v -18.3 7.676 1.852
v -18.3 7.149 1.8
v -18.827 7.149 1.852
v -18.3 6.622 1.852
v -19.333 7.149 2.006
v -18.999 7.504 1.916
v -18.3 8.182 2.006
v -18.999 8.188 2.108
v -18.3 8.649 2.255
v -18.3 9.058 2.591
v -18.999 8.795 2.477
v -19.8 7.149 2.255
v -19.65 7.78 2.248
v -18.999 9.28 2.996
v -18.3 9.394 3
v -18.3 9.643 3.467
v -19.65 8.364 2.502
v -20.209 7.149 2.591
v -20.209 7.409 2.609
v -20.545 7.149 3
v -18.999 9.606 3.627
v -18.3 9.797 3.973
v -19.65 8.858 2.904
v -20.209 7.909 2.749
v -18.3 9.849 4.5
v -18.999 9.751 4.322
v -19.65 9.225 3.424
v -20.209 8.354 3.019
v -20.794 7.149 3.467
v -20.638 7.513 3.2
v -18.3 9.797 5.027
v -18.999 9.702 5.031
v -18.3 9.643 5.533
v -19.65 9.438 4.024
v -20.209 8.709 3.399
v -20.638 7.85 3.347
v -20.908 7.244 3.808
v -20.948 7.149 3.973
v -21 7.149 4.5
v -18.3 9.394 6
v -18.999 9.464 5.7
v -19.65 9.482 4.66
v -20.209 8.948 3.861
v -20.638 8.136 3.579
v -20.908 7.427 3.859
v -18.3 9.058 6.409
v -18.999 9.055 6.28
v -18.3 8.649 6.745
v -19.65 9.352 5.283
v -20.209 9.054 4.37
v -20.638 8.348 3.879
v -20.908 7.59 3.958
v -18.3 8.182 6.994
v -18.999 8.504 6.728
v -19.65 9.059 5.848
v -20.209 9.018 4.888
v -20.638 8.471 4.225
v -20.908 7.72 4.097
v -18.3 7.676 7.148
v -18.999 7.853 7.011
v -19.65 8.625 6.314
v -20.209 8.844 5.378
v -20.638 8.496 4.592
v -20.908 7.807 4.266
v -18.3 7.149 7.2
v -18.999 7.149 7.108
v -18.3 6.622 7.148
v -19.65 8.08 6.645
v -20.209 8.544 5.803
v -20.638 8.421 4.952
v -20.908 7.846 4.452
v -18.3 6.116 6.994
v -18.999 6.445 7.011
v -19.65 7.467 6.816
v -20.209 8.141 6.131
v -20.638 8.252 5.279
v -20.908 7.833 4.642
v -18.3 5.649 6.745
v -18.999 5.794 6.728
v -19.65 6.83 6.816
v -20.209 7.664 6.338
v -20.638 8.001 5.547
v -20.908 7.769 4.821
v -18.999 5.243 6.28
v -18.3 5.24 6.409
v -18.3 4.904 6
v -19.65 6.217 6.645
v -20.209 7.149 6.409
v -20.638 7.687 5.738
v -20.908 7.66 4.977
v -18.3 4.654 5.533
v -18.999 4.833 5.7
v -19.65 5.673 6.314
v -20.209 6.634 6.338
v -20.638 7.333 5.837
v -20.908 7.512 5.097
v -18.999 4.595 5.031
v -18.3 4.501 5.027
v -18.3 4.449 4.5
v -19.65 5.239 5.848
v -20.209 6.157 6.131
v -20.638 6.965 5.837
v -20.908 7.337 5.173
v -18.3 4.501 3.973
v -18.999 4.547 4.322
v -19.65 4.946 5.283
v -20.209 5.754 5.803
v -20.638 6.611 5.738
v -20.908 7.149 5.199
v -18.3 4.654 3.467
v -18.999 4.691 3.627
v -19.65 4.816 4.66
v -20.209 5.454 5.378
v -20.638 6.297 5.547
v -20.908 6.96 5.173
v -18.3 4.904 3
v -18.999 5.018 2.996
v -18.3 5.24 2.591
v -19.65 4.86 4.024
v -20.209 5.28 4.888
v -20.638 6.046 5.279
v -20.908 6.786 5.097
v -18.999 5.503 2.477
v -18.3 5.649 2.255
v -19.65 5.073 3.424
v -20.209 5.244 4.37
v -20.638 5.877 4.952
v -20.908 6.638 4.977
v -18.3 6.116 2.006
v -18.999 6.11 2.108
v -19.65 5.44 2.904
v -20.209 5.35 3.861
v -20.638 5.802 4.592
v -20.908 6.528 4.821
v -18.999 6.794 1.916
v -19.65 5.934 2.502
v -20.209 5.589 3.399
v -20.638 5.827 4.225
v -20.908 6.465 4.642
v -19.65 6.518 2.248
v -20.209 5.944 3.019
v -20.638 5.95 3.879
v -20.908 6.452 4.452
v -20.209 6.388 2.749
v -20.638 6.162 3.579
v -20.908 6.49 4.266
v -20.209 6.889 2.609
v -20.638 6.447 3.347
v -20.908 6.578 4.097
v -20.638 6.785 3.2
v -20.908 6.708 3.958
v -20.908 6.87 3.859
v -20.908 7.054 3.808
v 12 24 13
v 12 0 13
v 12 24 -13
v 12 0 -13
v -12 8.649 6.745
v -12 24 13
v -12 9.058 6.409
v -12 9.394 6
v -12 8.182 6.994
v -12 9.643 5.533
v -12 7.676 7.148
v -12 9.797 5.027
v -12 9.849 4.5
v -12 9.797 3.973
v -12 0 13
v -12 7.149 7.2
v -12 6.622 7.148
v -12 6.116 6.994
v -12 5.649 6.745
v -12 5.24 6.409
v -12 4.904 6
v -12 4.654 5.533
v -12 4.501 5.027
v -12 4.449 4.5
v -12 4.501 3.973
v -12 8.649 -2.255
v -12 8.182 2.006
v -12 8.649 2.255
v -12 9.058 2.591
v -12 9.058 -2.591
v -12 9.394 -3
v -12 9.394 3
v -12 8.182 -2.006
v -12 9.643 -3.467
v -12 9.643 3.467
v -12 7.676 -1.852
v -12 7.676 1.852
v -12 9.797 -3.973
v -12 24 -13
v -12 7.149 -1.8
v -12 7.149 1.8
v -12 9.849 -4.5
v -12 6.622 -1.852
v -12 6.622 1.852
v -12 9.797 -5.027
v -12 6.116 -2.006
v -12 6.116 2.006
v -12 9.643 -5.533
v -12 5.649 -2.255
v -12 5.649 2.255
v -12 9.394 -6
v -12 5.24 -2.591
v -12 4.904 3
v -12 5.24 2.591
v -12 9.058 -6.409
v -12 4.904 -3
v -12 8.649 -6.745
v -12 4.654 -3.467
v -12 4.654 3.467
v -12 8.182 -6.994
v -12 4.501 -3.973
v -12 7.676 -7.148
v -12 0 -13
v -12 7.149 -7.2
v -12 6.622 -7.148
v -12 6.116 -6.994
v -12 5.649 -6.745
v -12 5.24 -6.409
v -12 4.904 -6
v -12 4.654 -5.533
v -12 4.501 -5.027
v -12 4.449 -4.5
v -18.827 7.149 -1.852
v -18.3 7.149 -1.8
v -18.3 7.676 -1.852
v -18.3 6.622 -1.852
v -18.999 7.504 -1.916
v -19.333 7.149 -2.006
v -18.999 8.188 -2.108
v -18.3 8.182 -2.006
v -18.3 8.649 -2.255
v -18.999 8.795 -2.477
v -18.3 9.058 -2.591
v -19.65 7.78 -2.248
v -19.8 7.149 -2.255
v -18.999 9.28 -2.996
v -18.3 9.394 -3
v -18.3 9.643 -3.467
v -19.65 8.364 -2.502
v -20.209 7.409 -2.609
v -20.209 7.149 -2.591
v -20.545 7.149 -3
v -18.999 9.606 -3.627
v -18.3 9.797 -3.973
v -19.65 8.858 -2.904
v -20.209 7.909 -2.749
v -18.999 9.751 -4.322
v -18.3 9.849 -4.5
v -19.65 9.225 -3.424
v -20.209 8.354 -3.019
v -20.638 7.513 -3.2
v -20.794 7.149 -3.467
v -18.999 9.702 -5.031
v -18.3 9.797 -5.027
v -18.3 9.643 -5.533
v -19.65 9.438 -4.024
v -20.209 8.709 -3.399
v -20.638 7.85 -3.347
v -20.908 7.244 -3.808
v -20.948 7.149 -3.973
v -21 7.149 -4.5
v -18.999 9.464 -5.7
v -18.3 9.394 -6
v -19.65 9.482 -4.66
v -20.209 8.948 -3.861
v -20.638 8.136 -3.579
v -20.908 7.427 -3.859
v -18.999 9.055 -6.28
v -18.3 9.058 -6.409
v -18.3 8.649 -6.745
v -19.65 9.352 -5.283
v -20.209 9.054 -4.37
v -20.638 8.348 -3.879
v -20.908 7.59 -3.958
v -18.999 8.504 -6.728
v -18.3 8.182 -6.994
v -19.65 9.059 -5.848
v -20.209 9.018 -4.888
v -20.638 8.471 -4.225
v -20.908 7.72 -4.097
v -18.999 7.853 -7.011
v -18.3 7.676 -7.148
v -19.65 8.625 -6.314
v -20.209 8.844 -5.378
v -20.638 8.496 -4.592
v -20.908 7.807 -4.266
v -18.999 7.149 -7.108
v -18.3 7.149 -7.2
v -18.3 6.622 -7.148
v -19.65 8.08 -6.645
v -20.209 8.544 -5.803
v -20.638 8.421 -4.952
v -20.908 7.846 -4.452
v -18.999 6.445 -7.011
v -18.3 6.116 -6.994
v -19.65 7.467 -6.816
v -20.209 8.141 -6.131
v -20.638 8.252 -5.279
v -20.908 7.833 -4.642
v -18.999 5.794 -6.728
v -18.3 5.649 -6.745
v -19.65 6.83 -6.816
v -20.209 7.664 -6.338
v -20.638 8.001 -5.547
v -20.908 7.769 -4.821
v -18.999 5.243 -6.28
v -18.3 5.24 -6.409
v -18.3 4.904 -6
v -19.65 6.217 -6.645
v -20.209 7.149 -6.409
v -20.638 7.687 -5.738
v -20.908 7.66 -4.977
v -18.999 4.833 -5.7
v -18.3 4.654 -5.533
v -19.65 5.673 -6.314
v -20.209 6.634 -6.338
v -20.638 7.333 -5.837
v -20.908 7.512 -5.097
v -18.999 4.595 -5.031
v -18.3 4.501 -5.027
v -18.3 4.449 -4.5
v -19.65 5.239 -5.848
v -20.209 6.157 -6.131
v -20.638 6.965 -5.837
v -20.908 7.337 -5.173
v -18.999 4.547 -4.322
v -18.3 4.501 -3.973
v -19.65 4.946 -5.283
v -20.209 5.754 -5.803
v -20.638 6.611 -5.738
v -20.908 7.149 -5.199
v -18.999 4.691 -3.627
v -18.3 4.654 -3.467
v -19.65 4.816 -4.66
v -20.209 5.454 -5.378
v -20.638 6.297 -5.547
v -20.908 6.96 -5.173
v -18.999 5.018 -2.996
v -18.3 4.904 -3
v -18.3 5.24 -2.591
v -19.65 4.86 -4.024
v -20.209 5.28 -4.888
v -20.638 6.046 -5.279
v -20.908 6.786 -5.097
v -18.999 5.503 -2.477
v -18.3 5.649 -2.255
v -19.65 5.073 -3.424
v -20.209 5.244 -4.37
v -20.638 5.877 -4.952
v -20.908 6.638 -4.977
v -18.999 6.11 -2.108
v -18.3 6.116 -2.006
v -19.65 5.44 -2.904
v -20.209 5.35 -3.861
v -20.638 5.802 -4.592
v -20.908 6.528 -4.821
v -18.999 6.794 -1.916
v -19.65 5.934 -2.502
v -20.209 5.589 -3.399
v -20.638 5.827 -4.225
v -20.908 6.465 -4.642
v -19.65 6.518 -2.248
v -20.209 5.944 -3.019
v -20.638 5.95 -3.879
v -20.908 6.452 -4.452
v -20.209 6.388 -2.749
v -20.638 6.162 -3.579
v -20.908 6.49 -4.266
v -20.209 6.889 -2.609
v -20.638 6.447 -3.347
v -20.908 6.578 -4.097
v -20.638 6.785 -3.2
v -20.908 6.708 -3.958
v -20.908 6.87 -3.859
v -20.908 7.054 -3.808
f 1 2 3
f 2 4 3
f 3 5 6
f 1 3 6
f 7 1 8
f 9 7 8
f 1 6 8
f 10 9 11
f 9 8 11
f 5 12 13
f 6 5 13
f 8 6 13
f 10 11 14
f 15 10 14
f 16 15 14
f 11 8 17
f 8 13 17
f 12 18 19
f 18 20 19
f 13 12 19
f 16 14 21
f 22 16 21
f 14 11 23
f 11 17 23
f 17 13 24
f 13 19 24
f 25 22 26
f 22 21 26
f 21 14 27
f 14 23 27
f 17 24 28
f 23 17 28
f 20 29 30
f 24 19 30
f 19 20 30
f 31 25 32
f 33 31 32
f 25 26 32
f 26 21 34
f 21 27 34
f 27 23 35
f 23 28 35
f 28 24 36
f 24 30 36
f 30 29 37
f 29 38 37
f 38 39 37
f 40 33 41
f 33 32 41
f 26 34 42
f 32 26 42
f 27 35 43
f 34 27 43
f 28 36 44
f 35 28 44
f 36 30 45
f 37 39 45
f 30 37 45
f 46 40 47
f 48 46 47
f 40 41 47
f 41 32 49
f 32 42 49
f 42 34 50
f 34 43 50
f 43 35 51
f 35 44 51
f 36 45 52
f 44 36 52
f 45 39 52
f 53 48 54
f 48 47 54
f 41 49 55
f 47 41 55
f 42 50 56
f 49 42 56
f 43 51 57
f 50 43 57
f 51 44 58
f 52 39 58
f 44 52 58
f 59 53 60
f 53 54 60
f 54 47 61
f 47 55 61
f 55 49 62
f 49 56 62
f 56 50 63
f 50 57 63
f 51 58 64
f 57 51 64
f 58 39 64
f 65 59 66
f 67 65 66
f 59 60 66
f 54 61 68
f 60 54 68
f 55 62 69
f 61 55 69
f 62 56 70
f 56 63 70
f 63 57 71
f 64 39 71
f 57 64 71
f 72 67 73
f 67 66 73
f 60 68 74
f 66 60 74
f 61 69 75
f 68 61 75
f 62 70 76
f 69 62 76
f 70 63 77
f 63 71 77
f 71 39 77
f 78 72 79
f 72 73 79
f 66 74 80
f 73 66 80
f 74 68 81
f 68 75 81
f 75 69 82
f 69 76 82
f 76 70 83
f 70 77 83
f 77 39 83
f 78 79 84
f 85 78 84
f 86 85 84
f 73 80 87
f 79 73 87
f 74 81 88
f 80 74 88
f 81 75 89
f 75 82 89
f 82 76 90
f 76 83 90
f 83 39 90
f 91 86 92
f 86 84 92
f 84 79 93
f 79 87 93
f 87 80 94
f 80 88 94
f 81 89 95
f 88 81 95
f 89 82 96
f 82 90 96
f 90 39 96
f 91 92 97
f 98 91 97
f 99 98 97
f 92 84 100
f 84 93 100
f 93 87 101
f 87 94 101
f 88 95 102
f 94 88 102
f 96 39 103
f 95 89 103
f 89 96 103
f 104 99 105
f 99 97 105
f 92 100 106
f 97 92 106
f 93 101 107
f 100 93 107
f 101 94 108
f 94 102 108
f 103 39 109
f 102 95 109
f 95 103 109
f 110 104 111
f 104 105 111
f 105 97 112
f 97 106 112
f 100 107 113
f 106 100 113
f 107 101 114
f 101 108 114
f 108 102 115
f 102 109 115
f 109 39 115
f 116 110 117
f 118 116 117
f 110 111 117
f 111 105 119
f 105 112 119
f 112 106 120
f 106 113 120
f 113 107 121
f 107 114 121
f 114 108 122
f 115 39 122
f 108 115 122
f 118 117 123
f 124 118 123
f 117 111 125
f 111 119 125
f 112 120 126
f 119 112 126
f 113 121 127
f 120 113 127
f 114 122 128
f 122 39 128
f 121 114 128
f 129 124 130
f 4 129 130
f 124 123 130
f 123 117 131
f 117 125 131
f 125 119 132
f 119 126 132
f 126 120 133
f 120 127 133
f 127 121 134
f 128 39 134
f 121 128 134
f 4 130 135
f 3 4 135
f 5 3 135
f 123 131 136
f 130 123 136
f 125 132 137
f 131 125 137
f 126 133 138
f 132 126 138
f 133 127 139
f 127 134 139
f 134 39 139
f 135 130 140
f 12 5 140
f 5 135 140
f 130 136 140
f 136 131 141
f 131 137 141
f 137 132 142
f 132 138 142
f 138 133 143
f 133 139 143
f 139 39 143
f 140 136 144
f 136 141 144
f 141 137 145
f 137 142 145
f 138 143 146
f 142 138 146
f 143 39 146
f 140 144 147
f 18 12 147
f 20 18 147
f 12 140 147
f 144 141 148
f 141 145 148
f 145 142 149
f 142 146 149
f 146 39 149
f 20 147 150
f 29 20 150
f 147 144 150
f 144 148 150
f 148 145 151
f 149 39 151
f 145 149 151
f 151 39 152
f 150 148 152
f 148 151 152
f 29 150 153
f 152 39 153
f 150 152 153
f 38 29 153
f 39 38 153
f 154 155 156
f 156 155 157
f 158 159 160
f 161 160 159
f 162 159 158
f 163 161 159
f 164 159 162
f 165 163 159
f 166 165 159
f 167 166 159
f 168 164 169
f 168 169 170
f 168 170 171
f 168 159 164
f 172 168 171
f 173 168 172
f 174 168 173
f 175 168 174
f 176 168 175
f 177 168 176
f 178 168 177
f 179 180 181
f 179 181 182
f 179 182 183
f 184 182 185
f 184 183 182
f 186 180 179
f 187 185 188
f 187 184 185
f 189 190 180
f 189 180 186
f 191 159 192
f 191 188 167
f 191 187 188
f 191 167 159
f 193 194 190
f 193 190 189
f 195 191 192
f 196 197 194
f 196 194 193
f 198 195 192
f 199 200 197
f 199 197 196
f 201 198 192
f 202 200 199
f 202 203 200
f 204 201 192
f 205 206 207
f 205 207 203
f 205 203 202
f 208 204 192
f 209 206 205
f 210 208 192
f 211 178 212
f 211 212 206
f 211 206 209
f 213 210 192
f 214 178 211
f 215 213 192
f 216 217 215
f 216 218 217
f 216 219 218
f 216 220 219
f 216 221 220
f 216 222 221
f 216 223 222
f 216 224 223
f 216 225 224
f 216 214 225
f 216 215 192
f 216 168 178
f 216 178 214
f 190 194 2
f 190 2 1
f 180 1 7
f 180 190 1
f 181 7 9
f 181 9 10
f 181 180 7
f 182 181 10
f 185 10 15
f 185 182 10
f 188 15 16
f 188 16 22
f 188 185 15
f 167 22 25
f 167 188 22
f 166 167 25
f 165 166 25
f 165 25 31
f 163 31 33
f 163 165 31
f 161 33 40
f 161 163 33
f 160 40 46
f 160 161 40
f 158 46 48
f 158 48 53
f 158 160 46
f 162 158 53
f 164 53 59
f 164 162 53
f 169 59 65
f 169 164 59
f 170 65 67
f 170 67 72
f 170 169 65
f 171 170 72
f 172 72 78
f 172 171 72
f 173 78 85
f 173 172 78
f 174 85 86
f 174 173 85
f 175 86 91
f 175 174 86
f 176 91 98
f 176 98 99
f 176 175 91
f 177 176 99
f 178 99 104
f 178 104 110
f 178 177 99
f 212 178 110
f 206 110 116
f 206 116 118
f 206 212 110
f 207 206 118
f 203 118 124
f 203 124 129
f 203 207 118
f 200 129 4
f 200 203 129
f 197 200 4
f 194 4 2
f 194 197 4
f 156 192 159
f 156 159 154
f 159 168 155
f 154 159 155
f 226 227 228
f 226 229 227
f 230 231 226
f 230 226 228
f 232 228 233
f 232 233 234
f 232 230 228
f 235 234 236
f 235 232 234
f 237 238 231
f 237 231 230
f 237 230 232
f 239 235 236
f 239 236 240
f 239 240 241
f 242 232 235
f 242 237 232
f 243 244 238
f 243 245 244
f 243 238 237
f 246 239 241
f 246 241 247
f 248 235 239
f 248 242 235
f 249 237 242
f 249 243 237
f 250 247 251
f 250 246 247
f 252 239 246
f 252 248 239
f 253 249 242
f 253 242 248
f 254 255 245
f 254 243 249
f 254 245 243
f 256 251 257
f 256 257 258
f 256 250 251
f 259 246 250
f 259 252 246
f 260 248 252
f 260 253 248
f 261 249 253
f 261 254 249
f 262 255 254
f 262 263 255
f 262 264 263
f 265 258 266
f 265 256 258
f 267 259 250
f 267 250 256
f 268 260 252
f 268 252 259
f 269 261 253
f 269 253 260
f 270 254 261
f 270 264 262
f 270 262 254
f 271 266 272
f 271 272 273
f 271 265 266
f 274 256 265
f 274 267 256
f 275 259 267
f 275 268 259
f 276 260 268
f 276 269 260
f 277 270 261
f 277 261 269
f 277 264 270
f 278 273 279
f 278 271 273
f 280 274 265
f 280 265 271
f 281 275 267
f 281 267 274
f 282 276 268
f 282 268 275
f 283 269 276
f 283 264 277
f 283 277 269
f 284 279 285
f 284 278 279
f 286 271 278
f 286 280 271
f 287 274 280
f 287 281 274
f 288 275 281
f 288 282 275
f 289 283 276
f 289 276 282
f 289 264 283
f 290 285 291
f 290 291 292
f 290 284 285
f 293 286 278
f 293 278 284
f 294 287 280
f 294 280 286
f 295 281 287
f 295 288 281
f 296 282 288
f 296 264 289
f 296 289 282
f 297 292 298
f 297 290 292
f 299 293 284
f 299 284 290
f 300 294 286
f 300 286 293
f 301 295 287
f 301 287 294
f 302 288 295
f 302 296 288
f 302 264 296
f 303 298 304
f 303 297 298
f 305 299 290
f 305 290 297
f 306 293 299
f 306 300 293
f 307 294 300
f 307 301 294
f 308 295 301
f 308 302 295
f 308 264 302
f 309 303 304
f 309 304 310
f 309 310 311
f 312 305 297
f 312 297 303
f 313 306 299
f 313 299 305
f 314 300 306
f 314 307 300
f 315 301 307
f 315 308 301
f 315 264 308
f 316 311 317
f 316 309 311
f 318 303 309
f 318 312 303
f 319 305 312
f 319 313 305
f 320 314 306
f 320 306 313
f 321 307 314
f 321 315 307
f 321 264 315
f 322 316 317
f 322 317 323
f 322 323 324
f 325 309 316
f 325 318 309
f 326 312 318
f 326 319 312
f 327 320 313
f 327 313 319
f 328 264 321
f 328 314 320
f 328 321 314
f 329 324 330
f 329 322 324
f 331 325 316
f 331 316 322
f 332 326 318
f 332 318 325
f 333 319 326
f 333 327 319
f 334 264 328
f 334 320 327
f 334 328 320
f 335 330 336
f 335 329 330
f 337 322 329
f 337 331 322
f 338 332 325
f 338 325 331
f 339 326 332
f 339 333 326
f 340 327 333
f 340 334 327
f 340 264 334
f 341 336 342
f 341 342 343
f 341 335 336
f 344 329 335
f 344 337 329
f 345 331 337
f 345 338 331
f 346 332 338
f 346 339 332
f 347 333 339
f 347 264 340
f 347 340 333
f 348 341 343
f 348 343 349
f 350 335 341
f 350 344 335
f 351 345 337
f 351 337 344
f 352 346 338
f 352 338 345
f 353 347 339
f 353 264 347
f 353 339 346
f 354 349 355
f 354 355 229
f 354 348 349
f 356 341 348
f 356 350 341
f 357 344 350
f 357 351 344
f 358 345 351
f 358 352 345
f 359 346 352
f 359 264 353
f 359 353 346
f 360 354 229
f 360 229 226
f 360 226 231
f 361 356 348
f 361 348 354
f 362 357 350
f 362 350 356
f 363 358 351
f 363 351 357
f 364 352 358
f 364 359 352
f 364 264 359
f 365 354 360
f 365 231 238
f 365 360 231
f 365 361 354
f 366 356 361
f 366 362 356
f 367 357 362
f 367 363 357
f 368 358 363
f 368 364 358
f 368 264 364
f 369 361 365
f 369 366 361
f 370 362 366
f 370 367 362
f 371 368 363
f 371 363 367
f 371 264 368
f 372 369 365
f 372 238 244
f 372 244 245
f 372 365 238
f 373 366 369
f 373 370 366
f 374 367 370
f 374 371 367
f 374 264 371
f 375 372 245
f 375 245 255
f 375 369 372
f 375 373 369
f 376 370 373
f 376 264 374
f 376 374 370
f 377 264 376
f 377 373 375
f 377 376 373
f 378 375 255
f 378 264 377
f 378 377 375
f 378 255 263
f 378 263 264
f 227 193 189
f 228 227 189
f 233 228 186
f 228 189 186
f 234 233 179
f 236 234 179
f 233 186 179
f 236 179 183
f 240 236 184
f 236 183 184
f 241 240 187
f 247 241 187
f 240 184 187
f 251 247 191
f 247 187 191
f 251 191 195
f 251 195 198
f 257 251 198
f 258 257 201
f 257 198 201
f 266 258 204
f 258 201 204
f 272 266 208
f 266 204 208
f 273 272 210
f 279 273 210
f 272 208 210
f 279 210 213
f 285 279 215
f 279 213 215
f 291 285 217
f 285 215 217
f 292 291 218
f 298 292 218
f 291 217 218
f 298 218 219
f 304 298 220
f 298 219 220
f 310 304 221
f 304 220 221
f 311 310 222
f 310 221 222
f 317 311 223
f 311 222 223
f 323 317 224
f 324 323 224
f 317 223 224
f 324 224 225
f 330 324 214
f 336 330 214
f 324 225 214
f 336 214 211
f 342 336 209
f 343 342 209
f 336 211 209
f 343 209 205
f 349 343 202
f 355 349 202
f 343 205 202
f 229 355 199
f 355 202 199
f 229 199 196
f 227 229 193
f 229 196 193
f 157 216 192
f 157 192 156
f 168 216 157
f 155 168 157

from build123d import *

# Parameters (mm, degrees)
SKETCH1_W            = 24
SKETCH1_H            = 26
BOSS_EXTRUDE1_DEPTH  = 24
SKETCH2_R            = 2.7
BOSS_EXTRUDE2_DEPTH  = 9
FILLET2_R            = 2.7
FILLET2_OF_MIRROR2_R = 2.7


with BuildPart() as part:
    # Sketch1 → Boss-Extrude1 (new body)
    with BuildSketch(Plane(origin=(0, 0, 0), x_dir=(1, 0, 0), z_dir=(0, 1, 0))):
        Rectangle(SKETCH1_W, SKETCH1_H)
    extrude(amount=BOSS_EXTRUDE1_DEPTH)

    # Sketch2 → Boss-Extrude2 (add)
    with BuildSketch(Plane.ZY.offset(12)):
        with Locations((-4.5, 7.148873243)):
            Circle(SKETCH2_R)
    boss_extrude2 = extrude(amount=BOSS_EXTRUDE2_DEPTH)

    # Fillet2
    fillet2_edges = [part.edges().sort_by_distance(p)[0] for p in [
        (-21, 7.148873243, -7.2),
    ]]
    fillet(fillet2_edges, radius=FILLET2_R)

    # Mirror2: Boss-Extrude2 across plane
    add(boss_extrude2.mirror(Plane.XY))

    # Fillet2 of Mirror2
    fillet2_of_mirror2_edges = [part.edges().sort_by_distance(p)[0] for p in [
        (-21, 7.148873243, 7.2),
    ]]
    fillet(fillet2_of_mirror2_edges, radius=FILLET2_OF_MIRROR2_R)


solid = part.part
